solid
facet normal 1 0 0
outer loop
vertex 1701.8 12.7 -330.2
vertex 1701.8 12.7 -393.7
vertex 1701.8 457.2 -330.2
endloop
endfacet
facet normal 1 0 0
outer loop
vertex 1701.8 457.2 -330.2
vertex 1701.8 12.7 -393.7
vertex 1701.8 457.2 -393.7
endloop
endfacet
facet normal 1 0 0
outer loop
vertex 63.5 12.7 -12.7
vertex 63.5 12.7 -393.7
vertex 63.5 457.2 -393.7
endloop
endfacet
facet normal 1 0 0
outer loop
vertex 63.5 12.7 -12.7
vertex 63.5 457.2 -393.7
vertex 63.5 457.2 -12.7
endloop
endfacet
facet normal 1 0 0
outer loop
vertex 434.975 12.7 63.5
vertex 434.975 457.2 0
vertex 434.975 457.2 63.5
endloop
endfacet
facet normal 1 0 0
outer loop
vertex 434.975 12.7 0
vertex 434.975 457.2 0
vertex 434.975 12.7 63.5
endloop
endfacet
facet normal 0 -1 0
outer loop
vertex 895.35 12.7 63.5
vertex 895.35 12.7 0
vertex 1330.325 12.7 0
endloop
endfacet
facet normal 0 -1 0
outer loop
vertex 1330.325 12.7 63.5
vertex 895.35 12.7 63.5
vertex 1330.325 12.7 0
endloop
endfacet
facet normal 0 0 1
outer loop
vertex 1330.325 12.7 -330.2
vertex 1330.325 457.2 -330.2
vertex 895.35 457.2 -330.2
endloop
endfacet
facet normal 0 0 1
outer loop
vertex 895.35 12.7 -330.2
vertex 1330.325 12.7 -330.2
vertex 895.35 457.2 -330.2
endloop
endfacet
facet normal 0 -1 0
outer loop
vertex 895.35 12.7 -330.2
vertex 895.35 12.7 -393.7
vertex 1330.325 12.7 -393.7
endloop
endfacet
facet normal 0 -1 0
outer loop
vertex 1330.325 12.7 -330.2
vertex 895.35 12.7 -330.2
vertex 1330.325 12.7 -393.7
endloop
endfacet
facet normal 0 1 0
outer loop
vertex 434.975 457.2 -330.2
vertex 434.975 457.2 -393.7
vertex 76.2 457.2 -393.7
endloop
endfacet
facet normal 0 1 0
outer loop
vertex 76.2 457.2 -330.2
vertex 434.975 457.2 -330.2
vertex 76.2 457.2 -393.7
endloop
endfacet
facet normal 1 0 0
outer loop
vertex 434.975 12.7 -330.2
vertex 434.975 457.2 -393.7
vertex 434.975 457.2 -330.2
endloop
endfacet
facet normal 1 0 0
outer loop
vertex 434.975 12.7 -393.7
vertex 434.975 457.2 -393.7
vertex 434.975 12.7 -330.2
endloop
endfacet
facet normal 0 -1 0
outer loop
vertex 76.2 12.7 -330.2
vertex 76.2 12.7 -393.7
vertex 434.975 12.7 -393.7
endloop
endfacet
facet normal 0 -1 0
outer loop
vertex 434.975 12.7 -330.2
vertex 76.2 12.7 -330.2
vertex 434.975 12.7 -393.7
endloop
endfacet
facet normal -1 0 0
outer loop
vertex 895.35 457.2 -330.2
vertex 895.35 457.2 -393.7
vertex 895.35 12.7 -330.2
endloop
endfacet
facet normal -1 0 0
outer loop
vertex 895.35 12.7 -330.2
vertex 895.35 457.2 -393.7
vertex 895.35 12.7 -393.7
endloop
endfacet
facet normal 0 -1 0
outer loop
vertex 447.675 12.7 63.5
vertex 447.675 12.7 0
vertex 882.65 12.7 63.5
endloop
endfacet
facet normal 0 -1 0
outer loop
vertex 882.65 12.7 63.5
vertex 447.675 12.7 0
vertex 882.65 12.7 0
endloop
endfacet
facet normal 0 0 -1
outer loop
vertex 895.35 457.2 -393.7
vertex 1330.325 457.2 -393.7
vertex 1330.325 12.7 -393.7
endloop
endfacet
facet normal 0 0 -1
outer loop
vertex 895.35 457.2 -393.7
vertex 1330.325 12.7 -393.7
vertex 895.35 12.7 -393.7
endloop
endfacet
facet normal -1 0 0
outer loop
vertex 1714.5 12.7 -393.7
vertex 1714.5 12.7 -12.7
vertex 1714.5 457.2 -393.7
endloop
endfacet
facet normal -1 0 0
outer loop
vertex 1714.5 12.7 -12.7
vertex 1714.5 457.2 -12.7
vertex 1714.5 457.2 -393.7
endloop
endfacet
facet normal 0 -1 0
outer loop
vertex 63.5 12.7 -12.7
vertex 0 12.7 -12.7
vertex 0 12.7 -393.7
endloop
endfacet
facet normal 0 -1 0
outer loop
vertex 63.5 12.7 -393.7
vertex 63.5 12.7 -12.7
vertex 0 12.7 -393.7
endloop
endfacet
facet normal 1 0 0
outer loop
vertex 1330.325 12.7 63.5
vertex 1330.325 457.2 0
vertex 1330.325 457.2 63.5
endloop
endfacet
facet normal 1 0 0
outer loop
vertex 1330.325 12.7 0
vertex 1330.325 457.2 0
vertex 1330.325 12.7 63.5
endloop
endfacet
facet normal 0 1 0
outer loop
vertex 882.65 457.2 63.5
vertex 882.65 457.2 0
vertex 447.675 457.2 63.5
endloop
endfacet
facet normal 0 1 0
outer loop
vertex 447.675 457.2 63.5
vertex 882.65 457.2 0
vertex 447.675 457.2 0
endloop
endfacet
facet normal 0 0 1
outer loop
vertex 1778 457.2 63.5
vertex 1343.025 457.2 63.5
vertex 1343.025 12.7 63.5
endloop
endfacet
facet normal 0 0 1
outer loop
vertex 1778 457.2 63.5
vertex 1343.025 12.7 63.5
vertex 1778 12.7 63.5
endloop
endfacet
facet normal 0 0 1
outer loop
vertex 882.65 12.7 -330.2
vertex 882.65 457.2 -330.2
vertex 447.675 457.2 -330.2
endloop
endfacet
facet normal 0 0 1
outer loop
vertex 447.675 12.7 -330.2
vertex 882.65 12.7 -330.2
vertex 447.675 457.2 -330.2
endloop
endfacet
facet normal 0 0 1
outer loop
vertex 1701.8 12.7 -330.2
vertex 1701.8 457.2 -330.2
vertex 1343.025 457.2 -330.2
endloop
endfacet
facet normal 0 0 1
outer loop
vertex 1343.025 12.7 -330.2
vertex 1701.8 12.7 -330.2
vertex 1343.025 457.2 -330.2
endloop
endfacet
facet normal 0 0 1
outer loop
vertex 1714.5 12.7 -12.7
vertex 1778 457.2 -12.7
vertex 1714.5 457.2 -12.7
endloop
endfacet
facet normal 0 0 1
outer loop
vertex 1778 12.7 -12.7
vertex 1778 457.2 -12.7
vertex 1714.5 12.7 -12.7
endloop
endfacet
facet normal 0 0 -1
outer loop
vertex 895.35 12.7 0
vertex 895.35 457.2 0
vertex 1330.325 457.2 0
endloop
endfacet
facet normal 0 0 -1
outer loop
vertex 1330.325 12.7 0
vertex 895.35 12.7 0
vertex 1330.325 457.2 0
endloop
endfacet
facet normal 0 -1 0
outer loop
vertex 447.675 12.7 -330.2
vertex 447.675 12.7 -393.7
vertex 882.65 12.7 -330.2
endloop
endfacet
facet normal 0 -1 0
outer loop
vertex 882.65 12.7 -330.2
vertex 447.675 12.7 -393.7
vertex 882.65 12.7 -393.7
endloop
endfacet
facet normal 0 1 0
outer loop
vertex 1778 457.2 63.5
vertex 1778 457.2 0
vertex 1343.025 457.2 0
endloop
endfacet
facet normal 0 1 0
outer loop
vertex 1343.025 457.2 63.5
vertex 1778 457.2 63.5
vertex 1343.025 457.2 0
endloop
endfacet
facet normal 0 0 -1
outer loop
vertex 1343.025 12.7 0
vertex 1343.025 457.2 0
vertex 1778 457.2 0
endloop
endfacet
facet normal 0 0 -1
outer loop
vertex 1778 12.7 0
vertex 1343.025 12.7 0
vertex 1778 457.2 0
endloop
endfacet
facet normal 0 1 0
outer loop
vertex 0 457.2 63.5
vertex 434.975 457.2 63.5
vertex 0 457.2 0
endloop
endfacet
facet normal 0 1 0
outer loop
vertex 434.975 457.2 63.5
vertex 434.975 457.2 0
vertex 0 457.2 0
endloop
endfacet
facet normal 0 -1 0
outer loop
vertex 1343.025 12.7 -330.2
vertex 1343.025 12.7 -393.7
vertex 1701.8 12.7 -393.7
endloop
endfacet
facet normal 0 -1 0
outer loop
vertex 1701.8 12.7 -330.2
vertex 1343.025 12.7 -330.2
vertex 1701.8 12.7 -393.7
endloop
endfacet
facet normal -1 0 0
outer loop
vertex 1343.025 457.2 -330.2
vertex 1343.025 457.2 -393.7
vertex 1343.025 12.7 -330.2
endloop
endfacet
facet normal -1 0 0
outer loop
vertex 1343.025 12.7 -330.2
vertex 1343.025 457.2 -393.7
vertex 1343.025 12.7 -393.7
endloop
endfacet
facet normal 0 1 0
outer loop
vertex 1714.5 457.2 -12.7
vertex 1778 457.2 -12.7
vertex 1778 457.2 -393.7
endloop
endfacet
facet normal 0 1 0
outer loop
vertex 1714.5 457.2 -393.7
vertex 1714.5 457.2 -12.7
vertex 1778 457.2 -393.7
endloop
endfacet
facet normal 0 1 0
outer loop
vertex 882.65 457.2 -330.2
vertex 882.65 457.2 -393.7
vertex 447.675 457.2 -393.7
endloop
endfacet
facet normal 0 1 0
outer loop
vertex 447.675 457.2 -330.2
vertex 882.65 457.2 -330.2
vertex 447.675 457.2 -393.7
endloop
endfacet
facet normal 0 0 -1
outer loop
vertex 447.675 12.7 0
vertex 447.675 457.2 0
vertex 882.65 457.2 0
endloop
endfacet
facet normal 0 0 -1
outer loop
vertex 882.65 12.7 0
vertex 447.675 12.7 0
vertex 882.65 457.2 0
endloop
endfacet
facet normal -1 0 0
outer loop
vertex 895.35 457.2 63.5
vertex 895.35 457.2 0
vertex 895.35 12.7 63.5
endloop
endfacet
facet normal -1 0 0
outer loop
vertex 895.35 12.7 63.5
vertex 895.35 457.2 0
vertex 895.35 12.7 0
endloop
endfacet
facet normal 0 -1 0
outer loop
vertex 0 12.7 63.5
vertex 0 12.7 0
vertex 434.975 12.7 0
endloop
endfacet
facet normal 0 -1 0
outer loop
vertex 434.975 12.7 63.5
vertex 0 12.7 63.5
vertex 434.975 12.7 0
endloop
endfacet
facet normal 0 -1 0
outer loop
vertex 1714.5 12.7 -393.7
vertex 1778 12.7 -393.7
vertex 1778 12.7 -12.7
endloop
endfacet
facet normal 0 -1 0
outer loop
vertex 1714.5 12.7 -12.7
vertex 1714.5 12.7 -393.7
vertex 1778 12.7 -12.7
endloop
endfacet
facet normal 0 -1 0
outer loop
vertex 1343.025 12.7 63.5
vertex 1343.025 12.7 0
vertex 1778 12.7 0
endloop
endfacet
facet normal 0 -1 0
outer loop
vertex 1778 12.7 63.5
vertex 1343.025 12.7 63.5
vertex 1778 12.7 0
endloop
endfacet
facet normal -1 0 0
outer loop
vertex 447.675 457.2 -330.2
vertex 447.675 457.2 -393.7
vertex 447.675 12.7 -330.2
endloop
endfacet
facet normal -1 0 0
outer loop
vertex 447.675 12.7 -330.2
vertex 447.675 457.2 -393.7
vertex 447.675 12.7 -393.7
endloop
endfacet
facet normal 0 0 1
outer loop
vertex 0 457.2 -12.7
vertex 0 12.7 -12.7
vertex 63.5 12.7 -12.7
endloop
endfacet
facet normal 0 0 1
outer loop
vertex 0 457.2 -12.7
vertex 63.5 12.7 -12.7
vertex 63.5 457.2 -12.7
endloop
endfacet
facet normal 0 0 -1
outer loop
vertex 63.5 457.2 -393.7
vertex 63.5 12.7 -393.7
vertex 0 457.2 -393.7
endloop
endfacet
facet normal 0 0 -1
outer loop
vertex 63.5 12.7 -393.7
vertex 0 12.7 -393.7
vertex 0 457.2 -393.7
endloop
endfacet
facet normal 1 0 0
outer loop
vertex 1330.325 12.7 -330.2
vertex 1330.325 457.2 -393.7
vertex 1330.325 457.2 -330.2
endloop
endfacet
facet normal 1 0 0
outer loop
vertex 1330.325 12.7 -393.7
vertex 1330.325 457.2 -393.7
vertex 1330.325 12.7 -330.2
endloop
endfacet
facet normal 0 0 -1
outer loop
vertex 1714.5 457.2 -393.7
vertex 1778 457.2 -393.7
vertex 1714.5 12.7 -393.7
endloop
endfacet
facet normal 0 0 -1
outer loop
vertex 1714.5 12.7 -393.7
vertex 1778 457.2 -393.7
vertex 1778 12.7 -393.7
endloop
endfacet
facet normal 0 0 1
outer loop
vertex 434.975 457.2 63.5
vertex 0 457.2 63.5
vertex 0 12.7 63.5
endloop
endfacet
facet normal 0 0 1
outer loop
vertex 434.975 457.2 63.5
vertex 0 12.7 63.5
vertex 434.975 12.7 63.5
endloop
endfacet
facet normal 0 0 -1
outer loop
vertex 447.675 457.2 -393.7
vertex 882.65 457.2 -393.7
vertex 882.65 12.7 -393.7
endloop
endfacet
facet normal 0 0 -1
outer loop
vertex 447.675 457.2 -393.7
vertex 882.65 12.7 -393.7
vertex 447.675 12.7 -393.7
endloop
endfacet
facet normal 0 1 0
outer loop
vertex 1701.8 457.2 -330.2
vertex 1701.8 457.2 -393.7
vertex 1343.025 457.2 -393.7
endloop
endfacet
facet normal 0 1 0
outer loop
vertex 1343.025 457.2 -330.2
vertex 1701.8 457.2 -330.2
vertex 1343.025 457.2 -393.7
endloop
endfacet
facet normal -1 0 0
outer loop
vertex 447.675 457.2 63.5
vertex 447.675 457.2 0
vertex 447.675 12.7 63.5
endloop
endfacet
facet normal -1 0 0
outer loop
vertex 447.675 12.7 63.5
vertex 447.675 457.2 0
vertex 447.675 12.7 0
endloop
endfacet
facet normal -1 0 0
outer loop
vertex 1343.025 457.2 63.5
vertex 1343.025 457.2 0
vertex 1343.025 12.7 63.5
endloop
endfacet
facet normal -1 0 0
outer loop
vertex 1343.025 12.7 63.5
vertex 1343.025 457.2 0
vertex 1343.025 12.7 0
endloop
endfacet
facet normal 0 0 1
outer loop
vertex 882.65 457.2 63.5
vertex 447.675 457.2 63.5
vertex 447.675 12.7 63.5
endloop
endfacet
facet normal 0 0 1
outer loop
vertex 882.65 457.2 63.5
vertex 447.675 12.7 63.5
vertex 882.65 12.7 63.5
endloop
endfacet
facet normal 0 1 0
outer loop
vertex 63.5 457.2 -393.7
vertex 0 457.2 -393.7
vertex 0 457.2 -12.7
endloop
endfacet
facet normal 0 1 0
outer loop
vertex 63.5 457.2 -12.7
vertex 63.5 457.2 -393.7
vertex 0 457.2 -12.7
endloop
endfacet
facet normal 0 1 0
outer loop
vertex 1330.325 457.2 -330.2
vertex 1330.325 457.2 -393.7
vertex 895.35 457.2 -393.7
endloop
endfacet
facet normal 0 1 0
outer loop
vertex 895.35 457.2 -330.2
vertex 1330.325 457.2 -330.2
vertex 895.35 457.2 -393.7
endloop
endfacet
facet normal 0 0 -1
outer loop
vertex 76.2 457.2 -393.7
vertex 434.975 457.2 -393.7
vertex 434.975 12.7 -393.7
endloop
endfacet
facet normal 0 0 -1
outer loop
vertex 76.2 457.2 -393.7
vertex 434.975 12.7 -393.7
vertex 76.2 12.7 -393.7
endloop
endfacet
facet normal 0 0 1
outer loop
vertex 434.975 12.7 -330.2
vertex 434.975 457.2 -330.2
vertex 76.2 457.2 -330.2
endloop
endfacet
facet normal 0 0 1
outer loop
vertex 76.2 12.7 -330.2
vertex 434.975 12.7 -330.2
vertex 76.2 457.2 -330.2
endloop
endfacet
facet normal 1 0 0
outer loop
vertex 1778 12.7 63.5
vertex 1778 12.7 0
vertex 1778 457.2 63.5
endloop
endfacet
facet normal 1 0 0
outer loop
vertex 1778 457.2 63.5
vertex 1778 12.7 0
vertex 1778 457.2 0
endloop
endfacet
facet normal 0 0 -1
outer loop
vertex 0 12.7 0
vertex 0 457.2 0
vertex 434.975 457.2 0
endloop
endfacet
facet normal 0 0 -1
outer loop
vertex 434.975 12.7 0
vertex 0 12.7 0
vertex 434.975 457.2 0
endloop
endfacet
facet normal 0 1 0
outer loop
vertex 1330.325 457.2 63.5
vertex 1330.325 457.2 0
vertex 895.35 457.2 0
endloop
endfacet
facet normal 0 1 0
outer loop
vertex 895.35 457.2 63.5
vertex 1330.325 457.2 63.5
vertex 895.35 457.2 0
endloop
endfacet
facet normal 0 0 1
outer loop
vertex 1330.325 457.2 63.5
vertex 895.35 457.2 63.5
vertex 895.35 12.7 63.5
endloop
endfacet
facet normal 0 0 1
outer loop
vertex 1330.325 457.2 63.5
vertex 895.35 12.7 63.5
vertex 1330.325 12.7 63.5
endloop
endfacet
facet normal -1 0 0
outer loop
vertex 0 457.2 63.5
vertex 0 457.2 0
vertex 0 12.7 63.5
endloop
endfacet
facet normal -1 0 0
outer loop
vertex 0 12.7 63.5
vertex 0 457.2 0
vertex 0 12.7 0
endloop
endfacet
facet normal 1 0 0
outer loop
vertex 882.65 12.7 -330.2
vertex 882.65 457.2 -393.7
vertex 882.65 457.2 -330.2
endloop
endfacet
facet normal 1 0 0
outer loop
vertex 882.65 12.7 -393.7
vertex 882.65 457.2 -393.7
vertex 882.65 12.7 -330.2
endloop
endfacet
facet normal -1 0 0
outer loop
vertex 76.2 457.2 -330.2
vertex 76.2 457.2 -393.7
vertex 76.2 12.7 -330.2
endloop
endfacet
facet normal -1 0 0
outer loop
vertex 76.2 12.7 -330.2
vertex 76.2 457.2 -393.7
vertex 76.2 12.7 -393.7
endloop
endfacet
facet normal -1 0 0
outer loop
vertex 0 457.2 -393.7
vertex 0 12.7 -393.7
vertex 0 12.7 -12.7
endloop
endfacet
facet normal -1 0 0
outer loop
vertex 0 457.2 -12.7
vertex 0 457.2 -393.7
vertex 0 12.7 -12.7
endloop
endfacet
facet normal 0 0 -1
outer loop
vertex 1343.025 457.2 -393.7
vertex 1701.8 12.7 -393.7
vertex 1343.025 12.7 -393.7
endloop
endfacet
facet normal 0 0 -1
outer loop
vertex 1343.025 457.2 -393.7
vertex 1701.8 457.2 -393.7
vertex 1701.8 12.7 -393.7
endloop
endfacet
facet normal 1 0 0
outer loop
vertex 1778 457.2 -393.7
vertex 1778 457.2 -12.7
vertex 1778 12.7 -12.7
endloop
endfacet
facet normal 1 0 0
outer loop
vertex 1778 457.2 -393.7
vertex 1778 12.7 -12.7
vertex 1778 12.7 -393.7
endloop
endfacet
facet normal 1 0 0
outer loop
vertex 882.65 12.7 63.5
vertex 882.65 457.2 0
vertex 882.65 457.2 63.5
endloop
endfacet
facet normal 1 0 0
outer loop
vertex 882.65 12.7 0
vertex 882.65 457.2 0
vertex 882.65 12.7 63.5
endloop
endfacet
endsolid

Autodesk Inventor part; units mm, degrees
ref_plane "YZ Plane" through (0, 0, 0) normal (1, 0, 0) x (0, 1, 0)
ref_plane "XZ Plane" through (0, 0, 0) normal (0, 1, 0) x (-1, 0, 0)
sketch "Sketch1" plane through (0, 0, 0) normal (0, 0, 1) x (1, 0, 0)
  line L0 (0, 0) -> (1778, 0)
  line L1 (1778, 0) -> (1778, 457.2)
  line L2 (1778, 457.2) -> (0, 457.2)
  line L3 (0, 457.2) -> (0, 0)
  line L4 (434.975, 457.2) -> (434.975, 0)
  line L5 (447.675, 457.2) -> (447.675, 0)
  line L6 (882.65, 457.2) -> (882.65, 0)
  line L7 (895.35, 457.2) -> (895.35, 0)
  line L8 (1330.325, 457.2) -> (1330.325, 0)
  line L9 (1343.025, 457.2) -> (1343.025, 0)
  dimension "d0" = 1778
  dimension "d1" = 457.2
  dimension "d2" = 434.975
  dimension "d3" = 12.7
  dimension "d4" = 434.975
  dimension "d5" = 12.7
  dimension "d6" = 434.975
  dimension "d7" = 12.7
  dimension "d8" = 434.975
extrude "Extrusion1" add sketch "Sketch1" along normal blind 63.5 contours L3 L2 L4 L0
extrude "Extrusion2" add sketch "Sketch1" along normal blind 63.5 separate body contours L5 L2 L6 L0
extrude "Extrusion3" add sketch "Sketch1" along normal blind 63.5 separate body contours L7 L2 L8 L0
extrude "Extrusion4" add sketch "Sketch1" along normal blind 63.5 separate body contours L9 L2 L1 L0
sketch "Sketch2" plane through (1778, 0, 0) normal (1, 0, 0) x (0, 0, -1)
  line L0 (0, 0) -> (0, 457.2) projected
  line L1 (12.7, 457.2) -> (12.7, 0)
  line L2 (0, 457.2) -> (-63.5, 457.2) projected
  line L3 (393.7, 457.2) -> (393.7, 0)
  line L4 (393.7, 0) -> (12.7, 0)
  line L5 (-63.5, 457.2) -> (0, 457.2)
  line L6 (12.7, 457.2) -> (393.7, 457.2)
  line L7 (0, 457.2) -> (-63.5, 457.2) projected
  dimension "d17" = 12.7
  dimension "d19" = 381
  dimension "d20" = 457.2
extrude "Extrusion5" add sketch "Sketch2" against normal blind 63.5 separate body
ref_plane "Work Plane1" through (889, 0, 0) normal (1, 0, 0) x (0, 0, -1)
mirror "Mirror1" about plane through (889, 0, 0) normal (1, 0, 0) bodies 5
sketch "Sketch3" plane through (1778, 0, -393.7) normal (0, 0, -1) x (-1, 0, 0)
  line L0 (63.5, 457.2) -> (63.5, 0) projected
  line L1 (1714.5, 457.2) -> (1714.5, 0) projected
  line L2 (434.975, 457.2) -> (434.975, 0) projected
  line L3 (447.675, 457.2) -> (447.675, 0) projected
  line L4 (882.65, 457.2) -> (882.65, 0) projected
  line L5 (895.35, 457.2) -> (895.35, 0) projected
  line L6 (1330.325, 457.2) -> (1330.325, 0) projected
  line L7 (1343.025, 457.2) -> (1343.025, 0) projected
  line L8 (0, 457.2) -> (434.975, 457.2) projected
  line L9 (76.2, 457.2) -> (434.975, 457.2)
  line L10 (434.975, 457.2) -> (434.975, 0)
  line L11 (434.975, 0) -> (76.2, 0)
  line L12 (76.2, 0) -> (76.2, 457.2)
  line L13 (447.675, 457.2) -> (882.65, 457.2) projected
  line L14 (447.675, 457.2) -> (882.65, 457.2)
  line L15 (882.65, 457.2) -> (882.65, 0)
  line L16 (882.65, 0) -> (447.675, 0)
  line L17 (447.675, 0) -> (447.675, 457.2)
  line L18 (895.35, 457.2) -> (1330.325, 457.2) projected
  line L19 (1330.325, 0) -> (895.35, 0) projected
  line L20 (895.35, 457.2) -> (1330.325, 457.2)
  line L21 (1330.325, 457.2) -> (1330.325, 0)
  line L22 (1330.325, 0) -> (895.35, 0)
  line L23 (895.35, 0) -> (895.35, 457.2)
  line L24 (1343.025, 457.2) -> (1701.8, 457.2)
  line L25 (1701.8, 457.2) -> (1701.8, 0)
  line L26 (1701.8, 0) -> (1343.025, 0)
  line L27 (1343.025, 0) -> (1343.025, 457.2)
  point P0 (1778, 0)
  dimension "d23" = 12.7
  dimension "d24" = 12.7
extrude "Extrusion6" add sketch "Sketch3" against normal blind 63.5 separate body contours L2 L11 L12 L8
extrude "Extrusion7" add sketch "Sketch3" against normal blind 63.5 separate body contours L13 L4 L16 L3
extrude "Extrusion8" add sketch "Sketch3" against normal blind 63.5 separate body contours L18 L6 L19 L5
extrude "Extrusion9" add sketch "Sketch3" against normal blind 63.5 separate body contours L24 L25 L26 L7
move faces "Move1" translate (0, 12.7, 0) faces at (1756.8333, 0, -139.7)
move faces "Move2" translate (0, 12.7, 0) faces at (1582.2083, 0, -351.3667)
move faces "Move3" translate (0, 12.7, 0) faces at (1185.3333, 0, -372.5333)
move faces "Move4" translate (0, 12.7, 0) faces at (737.6583, 0, -372.5333)
move faces "Move5" translate (0, 12.7, 0) faces at (315.3833, 0, -372.5333)
move faces "Move6" translate (0, 12.7, 0) faces at (21.1667, 0, -139.7)
move faces "Move7" translate (0, 12.7, 0) faces at (144.9917, 0, 21.1667)
move faces "Move8" translate (0, 12.7, 0) faces at (592.6667, 0, 21.1667)
move faces "Move9" translate (0, 12.7, 0) faces at (1040.3417, 0, 42.3333)
move faces "Move10" translate (0, 12.7, 0) faces at (1488.0167, 0, 21.1667)
properties part number "Standard - Amber select" material "Granite, Cut, Polished"
